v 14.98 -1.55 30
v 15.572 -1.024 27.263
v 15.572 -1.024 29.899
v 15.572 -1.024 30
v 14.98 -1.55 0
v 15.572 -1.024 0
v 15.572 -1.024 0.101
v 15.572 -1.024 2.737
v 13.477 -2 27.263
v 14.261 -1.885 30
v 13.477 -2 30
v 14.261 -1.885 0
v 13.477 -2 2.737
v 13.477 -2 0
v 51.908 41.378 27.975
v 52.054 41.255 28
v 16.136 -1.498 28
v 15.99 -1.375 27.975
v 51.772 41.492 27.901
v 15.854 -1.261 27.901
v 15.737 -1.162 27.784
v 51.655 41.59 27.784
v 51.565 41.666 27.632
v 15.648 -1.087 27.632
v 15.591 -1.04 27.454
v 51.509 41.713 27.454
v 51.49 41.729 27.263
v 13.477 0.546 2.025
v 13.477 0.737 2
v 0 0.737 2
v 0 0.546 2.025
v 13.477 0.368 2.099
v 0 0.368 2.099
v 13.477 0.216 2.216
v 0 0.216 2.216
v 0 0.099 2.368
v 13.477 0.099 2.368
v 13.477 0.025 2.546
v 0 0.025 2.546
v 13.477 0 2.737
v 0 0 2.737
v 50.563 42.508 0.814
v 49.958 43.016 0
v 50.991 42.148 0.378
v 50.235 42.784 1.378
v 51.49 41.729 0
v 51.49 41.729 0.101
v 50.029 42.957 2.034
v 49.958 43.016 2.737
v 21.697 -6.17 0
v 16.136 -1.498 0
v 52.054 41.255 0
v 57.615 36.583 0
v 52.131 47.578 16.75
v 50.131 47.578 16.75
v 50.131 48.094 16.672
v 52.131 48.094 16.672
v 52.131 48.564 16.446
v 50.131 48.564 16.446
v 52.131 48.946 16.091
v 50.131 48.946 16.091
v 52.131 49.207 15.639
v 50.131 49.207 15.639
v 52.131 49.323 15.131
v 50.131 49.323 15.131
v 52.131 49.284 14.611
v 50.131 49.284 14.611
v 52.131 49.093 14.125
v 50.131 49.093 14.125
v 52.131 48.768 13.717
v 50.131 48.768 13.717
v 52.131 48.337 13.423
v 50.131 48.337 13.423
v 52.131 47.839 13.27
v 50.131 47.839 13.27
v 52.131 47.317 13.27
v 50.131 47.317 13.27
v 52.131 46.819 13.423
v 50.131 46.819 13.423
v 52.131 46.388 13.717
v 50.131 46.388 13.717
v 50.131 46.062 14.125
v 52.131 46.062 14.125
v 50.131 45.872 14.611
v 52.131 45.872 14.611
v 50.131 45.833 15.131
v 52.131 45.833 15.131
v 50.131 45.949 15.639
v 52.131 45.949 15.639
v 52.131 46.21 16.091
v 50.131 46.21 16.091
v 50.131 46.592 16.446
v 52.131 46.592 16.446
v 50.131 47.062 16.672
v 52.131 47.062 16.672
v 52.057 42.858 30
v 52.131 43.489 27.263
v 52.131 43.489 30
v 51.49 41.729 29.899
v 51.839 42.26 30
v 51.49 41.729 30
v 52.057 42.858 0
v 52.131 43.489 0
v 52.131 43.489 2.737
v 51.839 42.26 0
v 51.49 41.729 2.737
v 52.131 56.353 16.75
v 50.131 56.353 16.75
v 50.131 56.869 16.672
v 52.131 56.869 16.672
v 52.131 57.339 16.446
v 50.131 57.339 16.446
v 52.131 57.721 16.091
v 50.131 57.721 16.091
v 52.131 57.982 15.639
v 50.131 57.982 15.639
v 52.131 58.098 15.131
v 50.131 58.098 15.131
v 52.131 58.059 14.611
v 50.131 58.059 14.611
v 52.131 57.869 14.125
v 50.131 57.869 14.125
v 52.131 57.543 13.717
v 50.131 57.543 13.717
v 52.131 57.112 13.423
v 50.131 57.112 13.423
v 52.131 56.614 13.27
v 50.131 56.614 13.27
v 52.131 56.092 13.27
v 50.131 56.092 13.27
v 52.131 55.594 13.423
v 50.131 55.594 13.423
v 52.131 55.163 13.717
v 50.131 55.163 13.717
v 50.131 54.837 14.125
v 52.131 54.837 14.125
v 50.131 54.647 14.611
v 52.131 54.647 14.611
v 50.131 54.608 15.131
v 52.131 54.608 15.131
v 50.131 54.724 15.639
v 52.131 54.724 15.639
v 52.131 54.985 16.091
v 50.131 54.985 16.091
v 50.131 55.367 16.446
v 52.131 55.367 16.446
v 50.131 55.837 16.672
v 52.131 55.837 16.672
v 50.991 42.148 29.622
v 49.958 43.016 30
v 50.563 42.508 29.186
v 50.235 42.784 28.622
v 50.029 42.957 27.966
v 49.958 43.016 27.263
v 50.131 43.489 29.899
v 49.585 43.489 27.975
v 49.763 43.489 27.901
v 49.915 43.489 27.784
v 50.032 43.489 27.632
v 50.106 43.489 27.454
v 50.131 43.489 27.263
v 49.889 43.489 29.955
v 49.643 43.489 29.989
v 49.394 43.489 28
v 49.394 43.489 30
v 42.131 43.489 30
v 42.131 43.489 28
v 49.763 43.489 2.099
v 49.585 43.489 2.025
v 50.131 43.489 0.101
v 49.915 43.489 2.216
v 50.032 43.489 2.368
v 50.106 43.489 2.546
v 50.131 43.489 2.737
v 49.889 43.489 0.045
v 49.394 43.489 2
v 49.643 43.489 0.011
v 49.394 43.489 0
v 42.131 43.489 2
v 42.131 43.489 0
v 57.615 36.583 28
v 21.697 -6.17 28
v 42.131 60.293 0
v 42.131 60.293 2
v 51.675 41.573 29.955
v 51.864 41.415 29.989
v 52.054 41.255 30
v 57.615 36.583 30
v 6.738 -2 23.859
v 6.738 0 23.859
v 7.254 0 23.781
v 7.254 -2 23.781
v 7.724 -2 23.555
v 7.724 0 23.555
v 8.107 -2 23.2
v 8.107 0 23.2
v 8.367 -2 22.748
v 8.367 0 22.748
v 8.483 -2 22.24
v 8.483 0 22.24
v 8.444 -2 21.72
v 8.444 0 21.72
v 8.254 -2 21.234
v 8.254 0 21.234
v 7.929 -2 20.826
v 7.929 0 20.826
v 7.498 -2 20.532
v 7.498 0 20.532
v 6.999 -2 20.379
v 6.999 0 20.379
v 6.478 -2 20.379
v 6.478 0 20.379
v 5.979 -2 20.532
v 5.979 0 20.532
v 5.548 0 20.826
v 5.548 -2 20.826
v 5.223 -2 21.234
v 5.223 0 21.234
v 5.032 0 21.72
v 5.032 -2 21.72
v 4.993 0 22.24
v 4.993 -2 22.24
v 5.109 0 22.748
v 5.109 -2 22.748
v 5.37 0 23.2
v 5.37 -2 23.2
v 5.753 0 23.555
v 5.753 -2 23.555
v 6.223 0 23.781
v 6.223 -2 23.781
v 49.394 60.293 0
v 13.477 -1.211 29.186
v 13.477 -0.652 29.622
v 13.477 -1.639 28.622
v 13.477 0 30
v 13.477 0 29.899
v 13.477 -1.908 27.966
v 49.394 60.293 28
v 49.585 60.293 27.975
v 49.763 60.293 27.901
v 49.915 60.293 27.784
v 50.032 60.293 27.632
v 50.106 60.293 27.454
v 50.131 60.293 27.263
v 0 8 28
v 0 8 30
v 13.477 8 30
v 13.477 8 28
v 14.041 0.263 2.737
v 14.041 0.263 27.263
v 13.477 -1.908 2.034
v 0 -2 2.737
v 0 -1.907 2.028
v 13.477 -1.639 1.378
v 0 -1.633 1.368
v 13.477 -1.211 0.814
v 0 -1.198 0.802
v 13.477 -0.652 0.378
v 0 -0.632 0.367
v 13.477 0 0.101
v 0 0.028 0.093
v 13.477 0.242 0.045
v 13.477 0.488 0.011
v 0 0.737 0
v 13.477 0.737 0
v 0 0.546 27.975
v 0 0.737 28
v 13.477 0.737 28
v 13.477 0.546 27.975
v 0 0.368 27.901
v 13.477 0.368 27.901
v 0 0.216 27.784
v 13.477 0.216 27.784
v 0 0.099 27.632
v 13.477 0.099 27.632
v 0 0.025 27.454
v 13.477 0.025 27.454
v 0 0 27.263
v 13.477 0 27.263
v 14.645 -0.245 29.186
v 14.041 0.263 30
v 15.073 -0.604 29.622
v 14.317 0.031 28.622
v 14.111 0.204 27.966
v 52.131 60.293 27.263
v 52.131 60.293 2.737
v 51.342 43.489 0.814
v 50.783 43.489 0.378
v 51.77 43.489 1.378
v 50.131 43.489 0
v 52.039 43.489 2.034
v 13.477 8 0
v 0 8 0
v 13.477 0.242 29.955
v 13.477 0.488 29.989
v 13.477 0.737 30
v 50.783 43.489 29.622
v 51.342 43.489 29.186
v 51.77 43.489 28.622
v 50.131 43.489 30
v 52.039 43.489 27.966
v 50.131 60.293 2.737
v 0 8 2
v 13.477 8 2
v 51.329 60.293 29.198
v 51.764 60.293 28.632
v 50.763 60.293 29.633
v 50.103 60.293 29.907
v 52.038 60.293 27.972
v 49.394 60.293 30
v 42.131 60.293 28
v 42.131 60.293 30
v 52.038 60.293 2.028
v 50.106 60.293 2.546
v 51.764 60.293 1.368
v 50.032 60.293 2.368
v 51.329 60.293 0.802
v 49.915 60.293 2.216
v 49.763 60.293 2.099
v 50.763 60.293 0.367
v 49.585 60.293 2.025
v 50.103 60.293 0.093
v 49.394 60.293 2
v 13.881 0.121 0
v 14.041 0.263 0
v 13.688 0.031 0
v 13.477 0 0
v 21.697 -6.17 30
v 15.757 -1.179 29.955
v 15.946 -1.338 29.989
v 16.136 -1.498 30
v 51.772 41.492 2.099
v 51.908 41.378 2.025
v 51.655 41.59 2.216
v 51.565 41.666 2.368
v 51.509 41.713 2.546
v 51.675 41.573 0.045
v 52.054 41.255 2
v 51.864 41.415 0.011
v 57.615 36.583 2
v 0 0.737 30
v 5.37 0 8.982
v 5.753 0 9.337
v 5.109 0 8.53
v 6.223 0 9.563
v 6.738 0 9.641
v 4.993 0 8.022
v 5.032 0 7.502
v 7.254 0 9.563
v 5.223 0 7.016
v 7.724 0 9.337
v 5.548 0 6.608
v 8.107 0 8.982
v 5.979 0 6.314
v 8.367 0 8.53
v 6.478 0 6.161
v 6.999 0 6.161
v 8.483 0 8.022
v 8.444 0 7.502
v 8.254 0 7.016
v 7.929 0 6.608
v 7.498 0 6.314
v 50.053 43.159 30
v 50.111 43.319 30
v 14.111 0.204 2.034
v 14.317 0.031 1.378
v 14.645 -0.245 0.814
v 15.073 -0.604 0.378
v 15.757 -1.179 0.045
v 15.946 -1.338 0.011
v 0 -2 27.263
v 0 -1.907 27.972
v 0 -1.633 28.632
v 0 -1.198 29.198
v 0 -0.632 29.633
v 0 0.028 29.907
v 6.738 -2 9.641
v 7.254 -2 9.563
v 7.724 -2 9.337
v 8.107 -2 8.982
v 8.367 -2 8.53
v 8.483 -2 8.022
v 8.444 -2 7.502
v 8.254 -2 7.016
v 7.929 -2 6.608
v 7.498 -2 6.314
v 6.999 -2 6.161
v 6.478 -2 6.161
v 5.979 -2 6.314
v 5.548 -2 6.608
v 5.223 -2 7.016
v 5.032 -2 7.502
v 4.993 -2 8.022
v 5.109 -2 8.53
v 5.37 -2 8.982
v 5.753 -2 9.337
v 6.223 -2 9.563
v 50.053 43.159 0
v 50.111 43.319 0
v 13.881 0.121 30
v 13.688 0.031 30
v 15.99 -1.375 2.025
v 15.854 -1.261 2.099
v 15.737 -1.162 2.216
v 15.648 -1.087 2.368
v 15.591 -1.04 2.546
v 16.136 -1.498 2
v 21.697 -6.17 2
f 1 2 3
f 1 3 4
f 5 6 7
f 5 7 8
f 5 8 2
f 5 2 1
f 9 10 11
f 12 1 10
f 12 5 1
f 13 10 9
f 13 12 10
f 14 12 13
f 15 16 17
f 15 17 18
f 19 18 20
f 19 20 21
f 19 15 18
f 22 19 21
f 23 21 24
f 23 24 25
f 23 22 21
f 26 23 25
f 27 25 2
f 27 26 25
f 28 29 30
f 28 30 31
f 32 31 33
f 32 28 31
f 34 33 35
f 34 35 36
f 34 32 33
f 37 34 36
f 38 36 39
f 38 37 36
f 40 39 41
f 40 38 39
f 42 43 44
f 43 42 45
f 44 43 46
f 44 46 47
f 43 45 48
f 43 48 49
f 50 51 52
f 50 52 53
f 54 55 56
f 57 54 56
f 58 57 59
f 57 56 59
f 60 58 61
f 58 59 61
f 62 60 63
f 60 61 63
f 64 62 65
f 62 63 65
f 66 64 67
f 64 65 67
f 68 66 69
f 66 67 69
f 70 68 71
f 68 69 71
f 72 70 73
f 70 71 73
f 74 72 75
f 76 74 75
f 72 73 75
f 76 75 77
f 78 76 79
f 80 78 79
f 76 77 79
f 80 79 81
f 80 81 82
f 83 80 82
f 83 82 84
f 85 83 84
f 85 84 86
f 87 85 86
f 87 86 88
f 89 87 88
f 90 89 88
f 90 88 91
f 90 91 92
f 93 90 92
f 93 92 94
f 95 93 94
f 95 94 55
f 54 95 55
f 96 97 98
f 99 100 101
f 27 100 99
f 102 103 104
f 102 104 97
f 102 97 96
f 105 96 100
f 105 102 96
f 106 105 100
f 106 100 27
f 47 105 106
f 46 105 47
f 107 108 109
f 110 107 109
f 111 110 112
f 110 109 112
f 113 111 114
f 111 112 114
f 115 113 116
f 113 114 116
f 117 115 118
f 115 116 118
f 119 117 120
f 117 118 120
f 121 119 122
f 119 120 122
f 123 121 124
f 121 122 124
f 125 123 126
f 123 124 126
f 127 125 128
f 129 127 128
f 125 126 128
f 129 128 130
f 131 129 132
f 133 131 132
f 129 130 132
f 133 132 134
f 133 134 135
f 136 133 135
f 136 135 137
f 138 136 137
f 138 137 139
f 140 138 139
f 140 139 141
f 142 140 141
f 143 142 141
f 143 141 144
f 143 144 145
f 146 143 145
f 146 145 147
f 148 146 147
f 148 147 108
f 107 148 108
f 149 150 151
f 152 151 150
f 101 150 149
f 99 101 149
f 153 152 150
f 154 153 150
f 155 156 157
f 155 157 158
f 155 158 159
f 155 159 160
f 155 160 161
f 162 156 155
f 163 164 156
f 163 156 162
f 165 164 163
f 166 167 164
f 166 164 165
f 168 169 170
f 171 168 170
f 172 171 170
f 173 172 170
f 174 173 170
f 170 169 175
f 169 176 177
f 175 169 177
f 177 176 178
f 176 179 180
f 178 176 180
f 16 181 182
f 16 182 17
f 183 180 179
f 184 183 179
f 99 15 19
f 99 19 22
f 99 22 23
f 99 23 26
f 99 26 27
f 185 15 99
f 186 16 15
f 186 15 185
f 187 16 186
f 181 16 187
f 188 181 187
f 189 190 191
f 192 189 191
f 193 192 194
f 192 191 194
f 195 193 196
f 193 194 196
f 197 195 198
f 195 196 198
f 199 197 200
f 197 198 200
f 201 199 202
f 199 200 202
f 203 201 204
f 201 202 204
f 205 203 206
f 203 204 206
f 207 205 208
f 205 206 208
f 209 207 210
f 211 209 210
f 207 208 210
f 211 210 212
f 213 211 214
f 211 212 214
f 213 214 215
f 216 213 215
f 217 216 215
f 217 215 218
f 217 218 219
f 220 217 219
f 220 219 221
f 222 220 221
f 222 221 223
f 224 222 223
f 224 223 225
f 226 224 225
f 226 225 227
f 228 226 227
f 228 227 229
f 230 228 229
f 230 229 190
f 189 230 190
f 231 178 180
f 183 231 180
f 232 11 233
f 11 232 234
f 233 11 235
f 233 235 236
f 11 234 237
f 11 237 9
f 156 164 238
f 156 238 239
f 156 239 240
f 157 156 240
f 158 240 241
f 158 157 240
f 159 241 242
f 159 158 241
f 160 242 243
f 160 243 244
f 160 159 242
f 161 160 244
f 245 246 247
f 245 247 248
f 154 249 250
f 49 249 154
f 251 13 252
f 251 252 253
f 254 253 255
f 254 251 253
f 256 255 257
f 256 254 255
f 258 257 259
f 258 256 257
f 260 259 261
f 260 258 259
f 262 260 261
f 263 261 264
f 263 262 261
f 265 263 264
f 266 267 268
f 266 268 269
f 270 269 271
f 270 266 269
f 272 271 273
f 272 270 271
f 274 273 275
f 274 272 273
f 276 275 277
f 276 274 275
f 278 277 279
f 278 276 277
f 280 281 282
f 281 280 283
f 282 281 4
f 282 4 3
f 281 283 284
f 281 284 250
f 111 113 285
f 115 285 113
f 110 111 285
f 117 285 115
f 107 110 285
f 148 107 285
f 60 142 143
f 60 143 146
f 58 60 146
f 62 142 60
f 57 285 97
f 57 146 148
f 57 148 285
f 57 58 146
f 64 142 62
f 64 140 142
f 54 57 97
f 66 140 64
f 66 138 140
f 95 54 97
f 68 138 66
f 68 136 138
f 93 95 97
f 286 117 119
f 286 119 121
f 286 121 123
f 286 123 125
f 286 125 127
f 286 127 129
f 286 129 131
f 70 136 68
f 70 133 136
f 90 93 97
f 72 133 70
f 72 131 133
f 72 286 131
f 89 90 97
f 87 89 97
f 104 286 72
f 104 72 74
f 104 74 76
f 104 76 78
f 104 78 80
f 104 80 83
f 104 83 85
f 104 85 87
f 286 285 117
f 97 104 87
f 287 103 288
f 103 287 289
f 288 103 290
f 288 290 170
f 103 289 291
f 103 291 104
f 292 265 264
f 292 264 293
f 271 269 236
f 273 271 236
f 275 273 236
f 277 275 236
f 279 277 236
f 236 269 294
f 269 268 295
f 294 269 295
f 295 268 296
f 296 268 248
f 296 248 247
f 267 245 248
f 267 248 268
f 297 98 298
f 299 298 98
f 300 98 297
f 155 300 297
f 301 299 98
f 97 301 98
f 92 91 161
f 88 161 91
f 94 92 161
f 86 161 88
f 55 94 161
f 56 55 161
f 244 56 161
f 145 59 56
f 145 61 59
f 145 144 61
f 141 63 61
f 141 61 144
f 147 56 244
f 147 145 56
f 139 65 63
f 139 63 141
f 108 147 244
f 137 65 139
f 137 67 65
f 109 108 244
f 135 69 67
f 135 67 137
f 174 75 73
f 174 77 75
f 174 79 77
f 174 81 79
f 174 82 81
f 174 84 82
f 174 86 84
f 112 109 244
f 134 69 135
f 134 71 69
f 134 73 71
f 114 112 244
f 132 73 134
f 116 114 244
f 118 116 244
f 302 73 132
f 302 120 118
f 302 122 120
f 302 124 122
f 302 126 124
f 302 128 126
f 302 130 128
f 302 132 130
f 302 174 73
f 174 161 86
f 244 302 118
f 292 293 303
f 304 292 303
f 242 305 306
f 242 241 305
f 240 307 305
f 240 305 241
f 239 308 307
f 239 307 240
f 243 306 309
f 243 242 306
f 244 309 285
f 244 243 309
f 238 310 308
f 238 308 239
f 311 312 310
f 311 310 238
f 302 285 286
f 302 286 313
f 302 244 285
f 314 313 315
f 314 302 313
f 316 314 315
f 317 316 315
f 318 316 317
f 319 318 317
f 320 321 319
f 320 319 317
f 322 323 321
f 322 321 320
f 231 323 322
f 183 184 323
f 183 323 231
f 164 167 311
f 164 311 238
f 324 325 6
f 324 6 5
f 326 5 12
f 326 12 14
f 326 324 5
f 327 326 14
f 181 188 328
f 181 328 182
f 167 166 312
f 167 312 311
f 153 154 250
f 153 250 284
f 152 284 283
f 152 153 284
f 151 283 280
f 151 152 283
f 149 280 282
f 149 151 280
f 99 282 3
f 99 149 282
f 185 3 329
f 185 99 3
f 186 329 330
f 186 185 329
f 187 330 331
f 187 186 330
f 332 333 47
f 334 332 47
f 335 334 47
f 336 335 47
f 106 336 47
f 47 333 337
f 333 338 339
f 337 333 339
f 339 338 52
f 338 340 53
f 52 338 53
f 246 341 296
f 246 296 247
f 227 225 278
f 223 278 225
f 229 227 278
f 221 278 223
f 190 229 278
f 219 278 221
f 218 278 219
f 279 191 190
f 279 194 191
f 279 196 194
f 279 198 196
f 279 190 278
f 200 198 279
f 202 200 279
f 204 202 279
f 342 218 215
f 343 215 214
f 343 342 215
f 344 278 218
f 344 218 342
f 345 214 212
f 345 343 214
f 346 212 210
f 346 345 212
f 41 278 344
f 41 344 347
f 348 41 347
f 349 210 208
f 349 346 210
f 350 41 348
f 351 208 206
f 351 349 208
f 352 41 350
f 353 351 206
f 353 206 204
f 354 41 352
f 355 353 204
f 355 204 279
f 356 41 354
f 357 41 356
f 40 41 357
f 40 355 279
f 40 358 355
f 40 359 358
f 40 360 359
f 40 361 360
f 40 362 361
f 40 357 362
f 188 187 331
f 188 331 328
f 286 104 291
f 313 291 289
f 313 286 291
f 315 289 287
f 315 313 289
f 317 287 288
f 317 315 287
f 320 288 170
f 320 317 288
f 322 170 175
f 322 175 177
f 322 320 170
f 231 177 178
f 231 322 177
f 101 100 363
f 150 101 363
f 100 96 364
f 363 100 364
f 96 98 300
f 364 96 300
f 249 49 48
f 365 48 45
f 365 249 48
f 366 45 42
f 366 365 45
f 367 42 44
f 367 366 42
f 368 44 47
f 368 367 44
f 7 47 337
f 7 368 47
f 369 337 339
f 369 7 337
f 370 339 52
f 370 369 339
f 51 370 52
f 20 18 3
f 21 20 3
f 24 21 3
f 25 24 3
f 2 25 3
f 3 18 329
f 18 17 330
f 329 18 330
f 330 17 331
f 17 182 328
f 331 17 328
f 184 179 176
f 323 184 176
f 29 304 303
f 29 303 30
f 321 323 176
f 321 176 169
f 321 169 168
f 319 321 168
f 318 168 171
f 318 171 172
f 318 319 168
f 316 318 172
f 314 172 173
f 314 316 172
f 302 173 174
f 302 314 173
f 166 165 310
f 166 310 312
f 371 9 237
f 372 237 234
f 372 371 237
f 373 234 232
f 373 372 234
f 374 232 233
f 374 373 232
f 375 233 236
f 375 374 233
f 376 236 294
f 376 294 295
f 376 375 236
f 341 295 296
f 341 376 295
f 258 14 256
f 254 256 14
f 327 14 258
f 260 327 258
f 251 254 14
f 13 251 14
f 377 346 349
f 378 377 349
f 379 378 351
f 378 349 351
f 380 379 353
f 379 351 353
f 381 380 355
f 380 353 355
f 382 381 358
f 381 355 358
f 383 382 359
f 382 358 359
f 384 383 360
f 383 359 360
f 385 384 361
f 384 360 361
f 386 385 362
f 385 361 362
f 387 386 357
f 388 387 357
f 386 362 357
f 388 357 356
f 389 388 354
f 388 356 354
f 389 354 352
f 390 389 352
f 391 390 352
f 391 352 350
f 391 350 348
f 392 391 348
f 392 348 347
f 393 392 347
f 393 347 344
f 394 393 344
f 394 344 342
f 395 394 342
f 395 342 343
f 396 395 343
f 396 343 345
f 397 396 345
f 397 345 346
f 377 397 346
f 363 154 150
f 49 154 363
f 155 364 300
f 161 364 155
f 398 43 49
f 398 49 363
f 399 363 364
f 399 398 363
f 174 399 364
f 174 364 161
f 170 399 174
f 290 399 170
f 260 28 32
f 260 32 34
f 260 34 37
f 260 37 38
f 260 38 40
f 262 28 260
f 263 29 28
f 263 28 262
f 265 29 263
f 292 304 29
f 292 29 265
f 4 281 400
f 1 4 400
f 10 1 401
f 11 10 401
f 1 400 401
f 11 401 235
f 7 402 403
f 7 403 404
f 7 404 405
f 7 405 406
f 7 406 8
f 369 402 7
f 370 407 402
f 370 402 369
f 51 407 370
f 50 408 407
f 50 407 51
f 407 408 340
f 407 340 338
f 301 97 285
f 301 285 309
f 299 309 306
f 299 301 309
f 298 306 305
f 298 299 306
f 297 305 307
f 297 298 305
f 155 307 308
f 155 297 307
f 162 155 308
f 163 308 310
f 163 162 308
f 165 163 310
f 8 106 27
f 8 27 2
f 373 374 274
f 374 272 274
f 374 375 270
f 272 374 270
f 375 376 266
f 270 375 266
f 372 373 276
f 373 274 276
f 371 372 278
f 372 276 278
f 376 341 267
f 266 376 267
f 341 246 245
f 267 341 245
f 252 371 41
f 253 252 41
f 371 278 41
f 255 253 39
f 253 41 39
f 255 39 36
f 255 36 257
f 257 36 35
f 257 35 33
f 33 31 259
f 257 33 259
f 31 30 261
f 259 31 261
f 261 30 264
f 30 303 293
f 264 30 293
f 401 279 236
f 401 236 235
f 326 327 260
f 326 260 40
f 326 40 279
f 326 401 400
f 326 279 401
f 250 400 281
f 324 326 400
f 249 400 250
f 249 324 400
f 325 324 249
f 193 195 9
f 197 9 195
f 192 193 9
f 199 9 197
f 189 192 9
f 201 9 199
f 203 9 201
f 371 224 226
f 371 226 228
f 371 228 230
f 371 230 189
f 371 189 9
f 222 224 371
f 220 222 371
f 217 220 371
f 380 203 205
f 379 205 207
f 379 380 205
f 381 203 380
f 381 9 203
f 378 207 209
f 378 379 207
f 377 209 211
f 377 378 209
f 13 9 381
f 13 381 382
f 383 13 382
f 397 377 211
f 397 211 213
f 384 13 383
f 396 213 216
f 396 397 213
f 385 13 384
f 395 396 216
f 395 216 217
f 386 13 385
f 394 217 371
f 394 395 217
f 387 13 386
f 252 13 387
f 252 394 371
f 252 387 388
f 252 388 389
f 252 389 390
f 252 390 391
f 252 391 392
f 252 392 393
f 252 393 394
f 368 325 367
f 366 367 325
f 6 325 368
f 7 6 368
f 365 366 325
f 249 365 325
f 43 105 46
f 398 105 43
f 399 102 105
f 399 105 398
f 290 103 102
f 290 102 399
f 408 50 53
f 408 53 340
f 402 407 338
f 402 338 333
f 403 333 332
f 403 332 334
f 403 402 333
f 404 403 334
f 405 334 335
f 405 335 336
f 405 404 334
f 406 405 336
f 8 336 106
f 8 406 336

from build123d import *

# Parameters (mm, degrees)
BASE_FLANGE1_DEPTH             = 30
EDGE_FLANGE1_STRIP_W           = 9.4732
EDGE_FLANGE1_STRIP_H           = 2
EDGE_FLANGE1_STRIP_CUT_DEPTH   = 16.803293835
EDGE_FLANGE1_STRIP_2_W         = 9.4732
EDGE_FLANGE1_STRIP_2_H         = 2
EDGE_FLANGE1_STRIP_CUT_2_DEPTH = 13.476690823
EDGE_FLANGE1_STRIP_3_W         = 9.4732
EDGE_FLANGE1_STRIP_3_H         = 2
EDGE_FLANGE1_STRIP_CUT_3_DEPTH = 16.803293835
EDGE_FLANGE1_STRIP_4_W         = 9.4732
EDGE_FLANGE1_STRIP_4_H         = 2
EDGE_FLANGE1_STRIP_CUT_4_DEPTH = 13.476690823
EDGE_FLANGE1_DEPTH             = 16.803293835
EDGE_FLANGE1_BEND_DEPTH        = 13.476690823
EDGE_FLANGE1_BEND_2_DEPTH      = 16.803293835
EDGE_FLANGE1_BEND_3_DEPTH      = 13.476690823
EDGE_FLANGE2_STRIP_W           = 9.4732
EDGE_FLANGE2_STRIP_H           = 2
EDGE_FLANGE2_STRIP_CUT_DEPTH   = 55.838043997
EDGE_FLANGE2_STRIP_2_W         = 9.4732
EDGE_FLANGE2_STRIP_2_H         = 2
EDGE_FLANGE2_STRIP_CUT_2_DEPTH = 55.838043997
EDGE_FLANGE2_DEPTH             = 55.838043997
EDGE_FLANGE2_BEND_DEPTH        = 55.838043997
SKETCH32_R                     = 1.75
CUT_EXTRUDE1_DEPTH             = 10
SKETCH33_R                     = 1.75
CUT_EXTRUDE2_DEPTH             = 10


# Sheet-metal steps are written as plain solids
with BuildPart() as part:
    # Sketch1 → Base-Flange1 (new body)
    with BuildSketch(Plane.XY):
        with BuildLine():
            Line((0, 0), (13.476690823, 0))
            ThreePointArc((13.476690823, 0), (13.787790598, 0.068920069), (14.040674196, 0.262783248))
            Line((14.040674196, 0.262783248), (49.95840521, 43.015604865))
            ThreePointArc((49.95840521, 43.015604865), (50.086523604, 43.237281371), (50.131021837, 43.489421617))
            Line((50.131021837, 43.489421617), (50.131021837, 60.292715453))
            Line((50.131021837, 60.292715453), (52.131021837, 60.292715453))
            Line((52.131021837, 60.292715453), (52.131021837, 43.489421617))
            ThreePointArc((52.131021837, 43.489421617), (51.965702989, 42.552675762), (51.489720369, 41.729108117))
            Line((51.489720369, 41.729108117), (15.571989355, -1.023713501))
            ThreePointArc((15.571989355, -1.023713501), (14.632481815, -1.743949686), (13.476690823, -2))
            Line((13.476690823, -2), (0, -2))
            Line((0, -2), (0, 0))
        make_face()
    extrude(amount=BASE_FLANGE1_DEPTH)

    # Edge-Flange1 strip (across the edge) → Edge-Flange1 strip cut (cut)
    with BuildSketch(Plane(origin=(50.131021837, 43.489421617, 30), x_dir=(0, 0, -1), z_dir=(0, 1, 0))):
        with Locations((-2, -1)):
            Rectangle(EDGE_FLANGE1_STRIP_W, EDGE_FLANGE1_STRIP_H)
    extrude(amount=EDGE_FLANGE1_STRIP_CUT_DEPTH, mode=Mode.SUBTRACT)

    # Edge-Flange1 strip 2 (across the edge) → Edge-Flange1 strip cut 2 (cut)
    with BuildSketch(Plane(origin=(0, 0, 30), x_dir=(0, 0, -1), z_dir=(1, 0, 0))):
        with Locations((-2, -1)):
            Rectangle(EDGE_FLANGE1_STRIP_2_W, EDGE_FLANGE1_STRIP_2_H)
    extrude(amount=EDGE_FLANGE1_STRIP_CUT_2_DEPTH, mode=Mode.SUBTRACT)

    # Edge-Flange1 strip 3 (across the edge) → Edge-Flange1 strip cut 3 (cut)
    with BuildSketch(Plane(origin=(50.131021837, 60.292715453, 0), x_dir=(0, 0, 1), z_dir=(0, -1, 0))):
        with Locations((-2, -1)):
            Rectangle(EDGE_FLANGE1_STRIP_3_W, EDGE_FLANGE1_STRIP_3_H)
    extrude(amount=EDGE_FLANGE1_STRIP_CUT_3_DEPTH, mode=Mode.SUBTRACT)

    # Edge-Flange1 strip 4 (across the edge) → Edge-Flange1 strip cut 4 (cut)
    with BuildSketch(Plane.ZY.offset(-13.476690823)):
        with Locations((-2, -1)):
            Rectangle(EDGE_FLANGE1_STRIP_4_W, EDGE_FLANGE1_STRIP_4_H)
    extrude(amount=EDGE_FLANGE1_STRIP_CUT_4_DEPTH, mode=Mode.SUBTRACT)

    # Edge-Flange1 section (across the edge) → Edge-Flange1 (add)
    with BuildSketch(Plane(origin=(50.131021837, 43.489421617, 30), x_dir=(0, 0, -1), z_dir=(0, 1, 0))):
        with BuildLine():
            Line((0, 0.7366), (0, 8))
            Line((0, 8), (2, 8))
            Line((2, 8), (2, 0.7366))
            ThreePointArc((2, 0.7366), (2.215745145, 0.215745145), (2.7366, 0))
            Line((2.7366, 0), (2.7366, -2))
            ThreePointArc((2.7366, -2), (0.801531583, -1.198468417), (0, 0.7366))
        make_face()
    extrude(amount=EDGE_FLANGE1_DEPTH)

    # Edge-Flange1 section 2 (across the edge) → Edge-Flange1 bend (add)
    with BuildSketch(Plane(origin=(0, 0, 30), x_dir=(0, 0, -1), z_dir=(1, 0, 0))):
        with BuildLine():
            Line((0, 0.7366), (0, 8))
            Line((0, 8), (2, 8))
            Line((2, 8), (2, 0.7366))
            ThreePointArc((2, 0.7366), (2.215745145, 0.215745145), (2.7366, 0))
            Line((2.7366, 0), (2.7366, -2))
            ThreePointArc((2.7366, -2), (0.801531583, -1.198468417), (0, 0.7366))
        make_face()
    extrude(amount=EDGE_FLANGE1_BEND_DEPTH)

    # Edge-Flange1 section 3 (across the edge) → Edge-Flange1 bend 2 (add)
    with BuildSketch(Plane(origin=(50.131021837, 60.292715453, 0), x_dir=(0, 0, 1), z_dir=(0, -1, 0))):
        with BuildLine():
            Line((0, 0.7366), (0, 8))
            Line((0, 8), (2, 8))
            Line((2, 8), (2, 0.7366))
            ThreePointArc((2, 0.7366), (2.215745145, 0.215745145), (2.7366, 0))
            Line((2.7366, 0), (2.7366, -2))
            ThreePointArc((2.7366, -2), (0.801531583, -1.198468417), (0, 0.7366))
        make_face()
    extrude(amount=EDGE_FLANGE1_BEND_2_DEPTH)

    # Edge-Flange1 section 4 (across the edge) → Edge-Flange1 bend 3 (add)
    with BuildSketch(Plane.ZY.offset(-13.476690823)):
        with BuildLine():
            Line((0, 0.7366), (0, 8))
            Line((0, 8), (2, 8))
            Line((2, 8), (2, 0.7366))
            ThreePointArc((2, 0.7366), (2.215745145, 0.215745145), (2.7366, 0))
            Line((2.7366, 0), (2.7366, -2))
            ThreePointArc((2.7366, -2), (0.801531583, -1.198468417), (0, 0.7366))
        make_face()
    extrude(amount=EDGE_FLANGE1_BEND_3_DEPTH)

    # Edge-Flange2 strip (across the edge) → Edge-Flange2 strip cut (cut)
    with BuildSketch(Plane(origin=(51.489720369, 41.729108117, 30), x_dir=(0, 0, -1), z_dir=(-0.6432483740966664, -0.7656575796150621, 0))):
        with Locations((-2, -1)):
            Rectangle(EDGE_FLANGE2_STRIP_W, EDGE_FLANGE2_STRIP_H)
    extrude(amount=EDGE_FLANGE2_STRIP_CUT_DEPTH, mode=Mode.SUBTRACT)

    # Edge-Flange2 strip 2 (across the edge) → Edge-Flange2 strip cut 2 (cut)
    with BuildSketch(Plane(origin=(15.571989355, -1.023713501, 0), x_dir=(0, 0, 1), z_dir=(0.6432483740966664, 0.7656575796150621, 0))):
        with Locations((-2, -1)):
            Rectangle(EDGE_FLANGE2_STRIP_2_W, EDGE_FLANGE2_STRIP_2_H)
    extrude(amount=EDGE_FLANGE2_STRIP_CUT_2_DEPTH, mode=Mode.SUBTRACT)

    # Edge-Flange2 section (across the edge) → Edge-Flange2 (add)
    with BuildSketch(Plane(origin=(51.489720369, 41.729108117, 30), x_dir=(0, 0, -1), z_dir=(-0.6432483740966664, -0.7656575796150621, 0))):
        with BuildLine():
            Line((0, 0.7366), (0, 8))
            Line((0, 8), (2, 8))
            Line((2, 8), (2, 0.7366))
            ThreePointArc((2, 0.7366), (2.215745145, 0.215745145), (2.7366, 0))
            Line((2.7366, 0), (2.7366, -2))
            ThreePointArc((2.7366, -2), (0.801531583, -1.198468417), (0, 0.7366))
        make_face()
    extrude(amount=EDGE_FLANGE2_DEPTH)

    # Edge-Flange2 section 2 (across the edge) → Edge-Flange2 bend (add)
    with BuildSketch(Plane(origin=(15.571989355, -1.023713501, 0), x_dir=(0, 0, 1), z_dir=(0.6432483740966664, 0.7656575796150621, 0))):
        with BuildLine():
            Line((0, 0.7366), (0, 8))
            Line((0, 8), (2, 8))
            Line((2, 8), (2, 0.7366))
            ThreePointArc((2, 0.7366), (2.215745145, 0.215745145), (2.7366, 0))
            Line((2.7366, 0), (2.7366, -2))
            ThreePointArc((2.7366, -2), (0.801531583, -1.198468417), (0, 0.7366))
        make_face()
    extrude(amount=EDGE_FLANGE2_BEND_DEPTH)

    # Sketch32 → Cut-Extrude1 (cut)
    with BuildSketch(Plane(origin=(0, 0, 0), x_dir=(1, 0, 0), z_dir=(0, 1, 0))):
        with Locations(Location((6.738345411, -7.891027615, 0), (0, 0, 270))):
            Circle(SKETCH32_R)
        with Locations(Location((6.738345411, -22.108972385, 0), (0, 0, 270))):
            Circle(SKETCH32_R)
    extrude(amount=-CUT_EXTRUDE1_DEPTH, mode=Mode.SUBTRACT)

    # Sketch33 → Cut-Extrude2 (cut)
    with BuildSketch(Plane.ZY.offset(-50.131021837)):
        with Locations((15, 56.35303153)):
            Circle(SKETCH33_R)
        with Locations((15, 47.577872809)):
            Circle(SKETCH33_R)
    extrude(amount=-CUT_EXTRUDE2_DEPTH, mode=Mode.SUBTRACT)


solid = part.part
